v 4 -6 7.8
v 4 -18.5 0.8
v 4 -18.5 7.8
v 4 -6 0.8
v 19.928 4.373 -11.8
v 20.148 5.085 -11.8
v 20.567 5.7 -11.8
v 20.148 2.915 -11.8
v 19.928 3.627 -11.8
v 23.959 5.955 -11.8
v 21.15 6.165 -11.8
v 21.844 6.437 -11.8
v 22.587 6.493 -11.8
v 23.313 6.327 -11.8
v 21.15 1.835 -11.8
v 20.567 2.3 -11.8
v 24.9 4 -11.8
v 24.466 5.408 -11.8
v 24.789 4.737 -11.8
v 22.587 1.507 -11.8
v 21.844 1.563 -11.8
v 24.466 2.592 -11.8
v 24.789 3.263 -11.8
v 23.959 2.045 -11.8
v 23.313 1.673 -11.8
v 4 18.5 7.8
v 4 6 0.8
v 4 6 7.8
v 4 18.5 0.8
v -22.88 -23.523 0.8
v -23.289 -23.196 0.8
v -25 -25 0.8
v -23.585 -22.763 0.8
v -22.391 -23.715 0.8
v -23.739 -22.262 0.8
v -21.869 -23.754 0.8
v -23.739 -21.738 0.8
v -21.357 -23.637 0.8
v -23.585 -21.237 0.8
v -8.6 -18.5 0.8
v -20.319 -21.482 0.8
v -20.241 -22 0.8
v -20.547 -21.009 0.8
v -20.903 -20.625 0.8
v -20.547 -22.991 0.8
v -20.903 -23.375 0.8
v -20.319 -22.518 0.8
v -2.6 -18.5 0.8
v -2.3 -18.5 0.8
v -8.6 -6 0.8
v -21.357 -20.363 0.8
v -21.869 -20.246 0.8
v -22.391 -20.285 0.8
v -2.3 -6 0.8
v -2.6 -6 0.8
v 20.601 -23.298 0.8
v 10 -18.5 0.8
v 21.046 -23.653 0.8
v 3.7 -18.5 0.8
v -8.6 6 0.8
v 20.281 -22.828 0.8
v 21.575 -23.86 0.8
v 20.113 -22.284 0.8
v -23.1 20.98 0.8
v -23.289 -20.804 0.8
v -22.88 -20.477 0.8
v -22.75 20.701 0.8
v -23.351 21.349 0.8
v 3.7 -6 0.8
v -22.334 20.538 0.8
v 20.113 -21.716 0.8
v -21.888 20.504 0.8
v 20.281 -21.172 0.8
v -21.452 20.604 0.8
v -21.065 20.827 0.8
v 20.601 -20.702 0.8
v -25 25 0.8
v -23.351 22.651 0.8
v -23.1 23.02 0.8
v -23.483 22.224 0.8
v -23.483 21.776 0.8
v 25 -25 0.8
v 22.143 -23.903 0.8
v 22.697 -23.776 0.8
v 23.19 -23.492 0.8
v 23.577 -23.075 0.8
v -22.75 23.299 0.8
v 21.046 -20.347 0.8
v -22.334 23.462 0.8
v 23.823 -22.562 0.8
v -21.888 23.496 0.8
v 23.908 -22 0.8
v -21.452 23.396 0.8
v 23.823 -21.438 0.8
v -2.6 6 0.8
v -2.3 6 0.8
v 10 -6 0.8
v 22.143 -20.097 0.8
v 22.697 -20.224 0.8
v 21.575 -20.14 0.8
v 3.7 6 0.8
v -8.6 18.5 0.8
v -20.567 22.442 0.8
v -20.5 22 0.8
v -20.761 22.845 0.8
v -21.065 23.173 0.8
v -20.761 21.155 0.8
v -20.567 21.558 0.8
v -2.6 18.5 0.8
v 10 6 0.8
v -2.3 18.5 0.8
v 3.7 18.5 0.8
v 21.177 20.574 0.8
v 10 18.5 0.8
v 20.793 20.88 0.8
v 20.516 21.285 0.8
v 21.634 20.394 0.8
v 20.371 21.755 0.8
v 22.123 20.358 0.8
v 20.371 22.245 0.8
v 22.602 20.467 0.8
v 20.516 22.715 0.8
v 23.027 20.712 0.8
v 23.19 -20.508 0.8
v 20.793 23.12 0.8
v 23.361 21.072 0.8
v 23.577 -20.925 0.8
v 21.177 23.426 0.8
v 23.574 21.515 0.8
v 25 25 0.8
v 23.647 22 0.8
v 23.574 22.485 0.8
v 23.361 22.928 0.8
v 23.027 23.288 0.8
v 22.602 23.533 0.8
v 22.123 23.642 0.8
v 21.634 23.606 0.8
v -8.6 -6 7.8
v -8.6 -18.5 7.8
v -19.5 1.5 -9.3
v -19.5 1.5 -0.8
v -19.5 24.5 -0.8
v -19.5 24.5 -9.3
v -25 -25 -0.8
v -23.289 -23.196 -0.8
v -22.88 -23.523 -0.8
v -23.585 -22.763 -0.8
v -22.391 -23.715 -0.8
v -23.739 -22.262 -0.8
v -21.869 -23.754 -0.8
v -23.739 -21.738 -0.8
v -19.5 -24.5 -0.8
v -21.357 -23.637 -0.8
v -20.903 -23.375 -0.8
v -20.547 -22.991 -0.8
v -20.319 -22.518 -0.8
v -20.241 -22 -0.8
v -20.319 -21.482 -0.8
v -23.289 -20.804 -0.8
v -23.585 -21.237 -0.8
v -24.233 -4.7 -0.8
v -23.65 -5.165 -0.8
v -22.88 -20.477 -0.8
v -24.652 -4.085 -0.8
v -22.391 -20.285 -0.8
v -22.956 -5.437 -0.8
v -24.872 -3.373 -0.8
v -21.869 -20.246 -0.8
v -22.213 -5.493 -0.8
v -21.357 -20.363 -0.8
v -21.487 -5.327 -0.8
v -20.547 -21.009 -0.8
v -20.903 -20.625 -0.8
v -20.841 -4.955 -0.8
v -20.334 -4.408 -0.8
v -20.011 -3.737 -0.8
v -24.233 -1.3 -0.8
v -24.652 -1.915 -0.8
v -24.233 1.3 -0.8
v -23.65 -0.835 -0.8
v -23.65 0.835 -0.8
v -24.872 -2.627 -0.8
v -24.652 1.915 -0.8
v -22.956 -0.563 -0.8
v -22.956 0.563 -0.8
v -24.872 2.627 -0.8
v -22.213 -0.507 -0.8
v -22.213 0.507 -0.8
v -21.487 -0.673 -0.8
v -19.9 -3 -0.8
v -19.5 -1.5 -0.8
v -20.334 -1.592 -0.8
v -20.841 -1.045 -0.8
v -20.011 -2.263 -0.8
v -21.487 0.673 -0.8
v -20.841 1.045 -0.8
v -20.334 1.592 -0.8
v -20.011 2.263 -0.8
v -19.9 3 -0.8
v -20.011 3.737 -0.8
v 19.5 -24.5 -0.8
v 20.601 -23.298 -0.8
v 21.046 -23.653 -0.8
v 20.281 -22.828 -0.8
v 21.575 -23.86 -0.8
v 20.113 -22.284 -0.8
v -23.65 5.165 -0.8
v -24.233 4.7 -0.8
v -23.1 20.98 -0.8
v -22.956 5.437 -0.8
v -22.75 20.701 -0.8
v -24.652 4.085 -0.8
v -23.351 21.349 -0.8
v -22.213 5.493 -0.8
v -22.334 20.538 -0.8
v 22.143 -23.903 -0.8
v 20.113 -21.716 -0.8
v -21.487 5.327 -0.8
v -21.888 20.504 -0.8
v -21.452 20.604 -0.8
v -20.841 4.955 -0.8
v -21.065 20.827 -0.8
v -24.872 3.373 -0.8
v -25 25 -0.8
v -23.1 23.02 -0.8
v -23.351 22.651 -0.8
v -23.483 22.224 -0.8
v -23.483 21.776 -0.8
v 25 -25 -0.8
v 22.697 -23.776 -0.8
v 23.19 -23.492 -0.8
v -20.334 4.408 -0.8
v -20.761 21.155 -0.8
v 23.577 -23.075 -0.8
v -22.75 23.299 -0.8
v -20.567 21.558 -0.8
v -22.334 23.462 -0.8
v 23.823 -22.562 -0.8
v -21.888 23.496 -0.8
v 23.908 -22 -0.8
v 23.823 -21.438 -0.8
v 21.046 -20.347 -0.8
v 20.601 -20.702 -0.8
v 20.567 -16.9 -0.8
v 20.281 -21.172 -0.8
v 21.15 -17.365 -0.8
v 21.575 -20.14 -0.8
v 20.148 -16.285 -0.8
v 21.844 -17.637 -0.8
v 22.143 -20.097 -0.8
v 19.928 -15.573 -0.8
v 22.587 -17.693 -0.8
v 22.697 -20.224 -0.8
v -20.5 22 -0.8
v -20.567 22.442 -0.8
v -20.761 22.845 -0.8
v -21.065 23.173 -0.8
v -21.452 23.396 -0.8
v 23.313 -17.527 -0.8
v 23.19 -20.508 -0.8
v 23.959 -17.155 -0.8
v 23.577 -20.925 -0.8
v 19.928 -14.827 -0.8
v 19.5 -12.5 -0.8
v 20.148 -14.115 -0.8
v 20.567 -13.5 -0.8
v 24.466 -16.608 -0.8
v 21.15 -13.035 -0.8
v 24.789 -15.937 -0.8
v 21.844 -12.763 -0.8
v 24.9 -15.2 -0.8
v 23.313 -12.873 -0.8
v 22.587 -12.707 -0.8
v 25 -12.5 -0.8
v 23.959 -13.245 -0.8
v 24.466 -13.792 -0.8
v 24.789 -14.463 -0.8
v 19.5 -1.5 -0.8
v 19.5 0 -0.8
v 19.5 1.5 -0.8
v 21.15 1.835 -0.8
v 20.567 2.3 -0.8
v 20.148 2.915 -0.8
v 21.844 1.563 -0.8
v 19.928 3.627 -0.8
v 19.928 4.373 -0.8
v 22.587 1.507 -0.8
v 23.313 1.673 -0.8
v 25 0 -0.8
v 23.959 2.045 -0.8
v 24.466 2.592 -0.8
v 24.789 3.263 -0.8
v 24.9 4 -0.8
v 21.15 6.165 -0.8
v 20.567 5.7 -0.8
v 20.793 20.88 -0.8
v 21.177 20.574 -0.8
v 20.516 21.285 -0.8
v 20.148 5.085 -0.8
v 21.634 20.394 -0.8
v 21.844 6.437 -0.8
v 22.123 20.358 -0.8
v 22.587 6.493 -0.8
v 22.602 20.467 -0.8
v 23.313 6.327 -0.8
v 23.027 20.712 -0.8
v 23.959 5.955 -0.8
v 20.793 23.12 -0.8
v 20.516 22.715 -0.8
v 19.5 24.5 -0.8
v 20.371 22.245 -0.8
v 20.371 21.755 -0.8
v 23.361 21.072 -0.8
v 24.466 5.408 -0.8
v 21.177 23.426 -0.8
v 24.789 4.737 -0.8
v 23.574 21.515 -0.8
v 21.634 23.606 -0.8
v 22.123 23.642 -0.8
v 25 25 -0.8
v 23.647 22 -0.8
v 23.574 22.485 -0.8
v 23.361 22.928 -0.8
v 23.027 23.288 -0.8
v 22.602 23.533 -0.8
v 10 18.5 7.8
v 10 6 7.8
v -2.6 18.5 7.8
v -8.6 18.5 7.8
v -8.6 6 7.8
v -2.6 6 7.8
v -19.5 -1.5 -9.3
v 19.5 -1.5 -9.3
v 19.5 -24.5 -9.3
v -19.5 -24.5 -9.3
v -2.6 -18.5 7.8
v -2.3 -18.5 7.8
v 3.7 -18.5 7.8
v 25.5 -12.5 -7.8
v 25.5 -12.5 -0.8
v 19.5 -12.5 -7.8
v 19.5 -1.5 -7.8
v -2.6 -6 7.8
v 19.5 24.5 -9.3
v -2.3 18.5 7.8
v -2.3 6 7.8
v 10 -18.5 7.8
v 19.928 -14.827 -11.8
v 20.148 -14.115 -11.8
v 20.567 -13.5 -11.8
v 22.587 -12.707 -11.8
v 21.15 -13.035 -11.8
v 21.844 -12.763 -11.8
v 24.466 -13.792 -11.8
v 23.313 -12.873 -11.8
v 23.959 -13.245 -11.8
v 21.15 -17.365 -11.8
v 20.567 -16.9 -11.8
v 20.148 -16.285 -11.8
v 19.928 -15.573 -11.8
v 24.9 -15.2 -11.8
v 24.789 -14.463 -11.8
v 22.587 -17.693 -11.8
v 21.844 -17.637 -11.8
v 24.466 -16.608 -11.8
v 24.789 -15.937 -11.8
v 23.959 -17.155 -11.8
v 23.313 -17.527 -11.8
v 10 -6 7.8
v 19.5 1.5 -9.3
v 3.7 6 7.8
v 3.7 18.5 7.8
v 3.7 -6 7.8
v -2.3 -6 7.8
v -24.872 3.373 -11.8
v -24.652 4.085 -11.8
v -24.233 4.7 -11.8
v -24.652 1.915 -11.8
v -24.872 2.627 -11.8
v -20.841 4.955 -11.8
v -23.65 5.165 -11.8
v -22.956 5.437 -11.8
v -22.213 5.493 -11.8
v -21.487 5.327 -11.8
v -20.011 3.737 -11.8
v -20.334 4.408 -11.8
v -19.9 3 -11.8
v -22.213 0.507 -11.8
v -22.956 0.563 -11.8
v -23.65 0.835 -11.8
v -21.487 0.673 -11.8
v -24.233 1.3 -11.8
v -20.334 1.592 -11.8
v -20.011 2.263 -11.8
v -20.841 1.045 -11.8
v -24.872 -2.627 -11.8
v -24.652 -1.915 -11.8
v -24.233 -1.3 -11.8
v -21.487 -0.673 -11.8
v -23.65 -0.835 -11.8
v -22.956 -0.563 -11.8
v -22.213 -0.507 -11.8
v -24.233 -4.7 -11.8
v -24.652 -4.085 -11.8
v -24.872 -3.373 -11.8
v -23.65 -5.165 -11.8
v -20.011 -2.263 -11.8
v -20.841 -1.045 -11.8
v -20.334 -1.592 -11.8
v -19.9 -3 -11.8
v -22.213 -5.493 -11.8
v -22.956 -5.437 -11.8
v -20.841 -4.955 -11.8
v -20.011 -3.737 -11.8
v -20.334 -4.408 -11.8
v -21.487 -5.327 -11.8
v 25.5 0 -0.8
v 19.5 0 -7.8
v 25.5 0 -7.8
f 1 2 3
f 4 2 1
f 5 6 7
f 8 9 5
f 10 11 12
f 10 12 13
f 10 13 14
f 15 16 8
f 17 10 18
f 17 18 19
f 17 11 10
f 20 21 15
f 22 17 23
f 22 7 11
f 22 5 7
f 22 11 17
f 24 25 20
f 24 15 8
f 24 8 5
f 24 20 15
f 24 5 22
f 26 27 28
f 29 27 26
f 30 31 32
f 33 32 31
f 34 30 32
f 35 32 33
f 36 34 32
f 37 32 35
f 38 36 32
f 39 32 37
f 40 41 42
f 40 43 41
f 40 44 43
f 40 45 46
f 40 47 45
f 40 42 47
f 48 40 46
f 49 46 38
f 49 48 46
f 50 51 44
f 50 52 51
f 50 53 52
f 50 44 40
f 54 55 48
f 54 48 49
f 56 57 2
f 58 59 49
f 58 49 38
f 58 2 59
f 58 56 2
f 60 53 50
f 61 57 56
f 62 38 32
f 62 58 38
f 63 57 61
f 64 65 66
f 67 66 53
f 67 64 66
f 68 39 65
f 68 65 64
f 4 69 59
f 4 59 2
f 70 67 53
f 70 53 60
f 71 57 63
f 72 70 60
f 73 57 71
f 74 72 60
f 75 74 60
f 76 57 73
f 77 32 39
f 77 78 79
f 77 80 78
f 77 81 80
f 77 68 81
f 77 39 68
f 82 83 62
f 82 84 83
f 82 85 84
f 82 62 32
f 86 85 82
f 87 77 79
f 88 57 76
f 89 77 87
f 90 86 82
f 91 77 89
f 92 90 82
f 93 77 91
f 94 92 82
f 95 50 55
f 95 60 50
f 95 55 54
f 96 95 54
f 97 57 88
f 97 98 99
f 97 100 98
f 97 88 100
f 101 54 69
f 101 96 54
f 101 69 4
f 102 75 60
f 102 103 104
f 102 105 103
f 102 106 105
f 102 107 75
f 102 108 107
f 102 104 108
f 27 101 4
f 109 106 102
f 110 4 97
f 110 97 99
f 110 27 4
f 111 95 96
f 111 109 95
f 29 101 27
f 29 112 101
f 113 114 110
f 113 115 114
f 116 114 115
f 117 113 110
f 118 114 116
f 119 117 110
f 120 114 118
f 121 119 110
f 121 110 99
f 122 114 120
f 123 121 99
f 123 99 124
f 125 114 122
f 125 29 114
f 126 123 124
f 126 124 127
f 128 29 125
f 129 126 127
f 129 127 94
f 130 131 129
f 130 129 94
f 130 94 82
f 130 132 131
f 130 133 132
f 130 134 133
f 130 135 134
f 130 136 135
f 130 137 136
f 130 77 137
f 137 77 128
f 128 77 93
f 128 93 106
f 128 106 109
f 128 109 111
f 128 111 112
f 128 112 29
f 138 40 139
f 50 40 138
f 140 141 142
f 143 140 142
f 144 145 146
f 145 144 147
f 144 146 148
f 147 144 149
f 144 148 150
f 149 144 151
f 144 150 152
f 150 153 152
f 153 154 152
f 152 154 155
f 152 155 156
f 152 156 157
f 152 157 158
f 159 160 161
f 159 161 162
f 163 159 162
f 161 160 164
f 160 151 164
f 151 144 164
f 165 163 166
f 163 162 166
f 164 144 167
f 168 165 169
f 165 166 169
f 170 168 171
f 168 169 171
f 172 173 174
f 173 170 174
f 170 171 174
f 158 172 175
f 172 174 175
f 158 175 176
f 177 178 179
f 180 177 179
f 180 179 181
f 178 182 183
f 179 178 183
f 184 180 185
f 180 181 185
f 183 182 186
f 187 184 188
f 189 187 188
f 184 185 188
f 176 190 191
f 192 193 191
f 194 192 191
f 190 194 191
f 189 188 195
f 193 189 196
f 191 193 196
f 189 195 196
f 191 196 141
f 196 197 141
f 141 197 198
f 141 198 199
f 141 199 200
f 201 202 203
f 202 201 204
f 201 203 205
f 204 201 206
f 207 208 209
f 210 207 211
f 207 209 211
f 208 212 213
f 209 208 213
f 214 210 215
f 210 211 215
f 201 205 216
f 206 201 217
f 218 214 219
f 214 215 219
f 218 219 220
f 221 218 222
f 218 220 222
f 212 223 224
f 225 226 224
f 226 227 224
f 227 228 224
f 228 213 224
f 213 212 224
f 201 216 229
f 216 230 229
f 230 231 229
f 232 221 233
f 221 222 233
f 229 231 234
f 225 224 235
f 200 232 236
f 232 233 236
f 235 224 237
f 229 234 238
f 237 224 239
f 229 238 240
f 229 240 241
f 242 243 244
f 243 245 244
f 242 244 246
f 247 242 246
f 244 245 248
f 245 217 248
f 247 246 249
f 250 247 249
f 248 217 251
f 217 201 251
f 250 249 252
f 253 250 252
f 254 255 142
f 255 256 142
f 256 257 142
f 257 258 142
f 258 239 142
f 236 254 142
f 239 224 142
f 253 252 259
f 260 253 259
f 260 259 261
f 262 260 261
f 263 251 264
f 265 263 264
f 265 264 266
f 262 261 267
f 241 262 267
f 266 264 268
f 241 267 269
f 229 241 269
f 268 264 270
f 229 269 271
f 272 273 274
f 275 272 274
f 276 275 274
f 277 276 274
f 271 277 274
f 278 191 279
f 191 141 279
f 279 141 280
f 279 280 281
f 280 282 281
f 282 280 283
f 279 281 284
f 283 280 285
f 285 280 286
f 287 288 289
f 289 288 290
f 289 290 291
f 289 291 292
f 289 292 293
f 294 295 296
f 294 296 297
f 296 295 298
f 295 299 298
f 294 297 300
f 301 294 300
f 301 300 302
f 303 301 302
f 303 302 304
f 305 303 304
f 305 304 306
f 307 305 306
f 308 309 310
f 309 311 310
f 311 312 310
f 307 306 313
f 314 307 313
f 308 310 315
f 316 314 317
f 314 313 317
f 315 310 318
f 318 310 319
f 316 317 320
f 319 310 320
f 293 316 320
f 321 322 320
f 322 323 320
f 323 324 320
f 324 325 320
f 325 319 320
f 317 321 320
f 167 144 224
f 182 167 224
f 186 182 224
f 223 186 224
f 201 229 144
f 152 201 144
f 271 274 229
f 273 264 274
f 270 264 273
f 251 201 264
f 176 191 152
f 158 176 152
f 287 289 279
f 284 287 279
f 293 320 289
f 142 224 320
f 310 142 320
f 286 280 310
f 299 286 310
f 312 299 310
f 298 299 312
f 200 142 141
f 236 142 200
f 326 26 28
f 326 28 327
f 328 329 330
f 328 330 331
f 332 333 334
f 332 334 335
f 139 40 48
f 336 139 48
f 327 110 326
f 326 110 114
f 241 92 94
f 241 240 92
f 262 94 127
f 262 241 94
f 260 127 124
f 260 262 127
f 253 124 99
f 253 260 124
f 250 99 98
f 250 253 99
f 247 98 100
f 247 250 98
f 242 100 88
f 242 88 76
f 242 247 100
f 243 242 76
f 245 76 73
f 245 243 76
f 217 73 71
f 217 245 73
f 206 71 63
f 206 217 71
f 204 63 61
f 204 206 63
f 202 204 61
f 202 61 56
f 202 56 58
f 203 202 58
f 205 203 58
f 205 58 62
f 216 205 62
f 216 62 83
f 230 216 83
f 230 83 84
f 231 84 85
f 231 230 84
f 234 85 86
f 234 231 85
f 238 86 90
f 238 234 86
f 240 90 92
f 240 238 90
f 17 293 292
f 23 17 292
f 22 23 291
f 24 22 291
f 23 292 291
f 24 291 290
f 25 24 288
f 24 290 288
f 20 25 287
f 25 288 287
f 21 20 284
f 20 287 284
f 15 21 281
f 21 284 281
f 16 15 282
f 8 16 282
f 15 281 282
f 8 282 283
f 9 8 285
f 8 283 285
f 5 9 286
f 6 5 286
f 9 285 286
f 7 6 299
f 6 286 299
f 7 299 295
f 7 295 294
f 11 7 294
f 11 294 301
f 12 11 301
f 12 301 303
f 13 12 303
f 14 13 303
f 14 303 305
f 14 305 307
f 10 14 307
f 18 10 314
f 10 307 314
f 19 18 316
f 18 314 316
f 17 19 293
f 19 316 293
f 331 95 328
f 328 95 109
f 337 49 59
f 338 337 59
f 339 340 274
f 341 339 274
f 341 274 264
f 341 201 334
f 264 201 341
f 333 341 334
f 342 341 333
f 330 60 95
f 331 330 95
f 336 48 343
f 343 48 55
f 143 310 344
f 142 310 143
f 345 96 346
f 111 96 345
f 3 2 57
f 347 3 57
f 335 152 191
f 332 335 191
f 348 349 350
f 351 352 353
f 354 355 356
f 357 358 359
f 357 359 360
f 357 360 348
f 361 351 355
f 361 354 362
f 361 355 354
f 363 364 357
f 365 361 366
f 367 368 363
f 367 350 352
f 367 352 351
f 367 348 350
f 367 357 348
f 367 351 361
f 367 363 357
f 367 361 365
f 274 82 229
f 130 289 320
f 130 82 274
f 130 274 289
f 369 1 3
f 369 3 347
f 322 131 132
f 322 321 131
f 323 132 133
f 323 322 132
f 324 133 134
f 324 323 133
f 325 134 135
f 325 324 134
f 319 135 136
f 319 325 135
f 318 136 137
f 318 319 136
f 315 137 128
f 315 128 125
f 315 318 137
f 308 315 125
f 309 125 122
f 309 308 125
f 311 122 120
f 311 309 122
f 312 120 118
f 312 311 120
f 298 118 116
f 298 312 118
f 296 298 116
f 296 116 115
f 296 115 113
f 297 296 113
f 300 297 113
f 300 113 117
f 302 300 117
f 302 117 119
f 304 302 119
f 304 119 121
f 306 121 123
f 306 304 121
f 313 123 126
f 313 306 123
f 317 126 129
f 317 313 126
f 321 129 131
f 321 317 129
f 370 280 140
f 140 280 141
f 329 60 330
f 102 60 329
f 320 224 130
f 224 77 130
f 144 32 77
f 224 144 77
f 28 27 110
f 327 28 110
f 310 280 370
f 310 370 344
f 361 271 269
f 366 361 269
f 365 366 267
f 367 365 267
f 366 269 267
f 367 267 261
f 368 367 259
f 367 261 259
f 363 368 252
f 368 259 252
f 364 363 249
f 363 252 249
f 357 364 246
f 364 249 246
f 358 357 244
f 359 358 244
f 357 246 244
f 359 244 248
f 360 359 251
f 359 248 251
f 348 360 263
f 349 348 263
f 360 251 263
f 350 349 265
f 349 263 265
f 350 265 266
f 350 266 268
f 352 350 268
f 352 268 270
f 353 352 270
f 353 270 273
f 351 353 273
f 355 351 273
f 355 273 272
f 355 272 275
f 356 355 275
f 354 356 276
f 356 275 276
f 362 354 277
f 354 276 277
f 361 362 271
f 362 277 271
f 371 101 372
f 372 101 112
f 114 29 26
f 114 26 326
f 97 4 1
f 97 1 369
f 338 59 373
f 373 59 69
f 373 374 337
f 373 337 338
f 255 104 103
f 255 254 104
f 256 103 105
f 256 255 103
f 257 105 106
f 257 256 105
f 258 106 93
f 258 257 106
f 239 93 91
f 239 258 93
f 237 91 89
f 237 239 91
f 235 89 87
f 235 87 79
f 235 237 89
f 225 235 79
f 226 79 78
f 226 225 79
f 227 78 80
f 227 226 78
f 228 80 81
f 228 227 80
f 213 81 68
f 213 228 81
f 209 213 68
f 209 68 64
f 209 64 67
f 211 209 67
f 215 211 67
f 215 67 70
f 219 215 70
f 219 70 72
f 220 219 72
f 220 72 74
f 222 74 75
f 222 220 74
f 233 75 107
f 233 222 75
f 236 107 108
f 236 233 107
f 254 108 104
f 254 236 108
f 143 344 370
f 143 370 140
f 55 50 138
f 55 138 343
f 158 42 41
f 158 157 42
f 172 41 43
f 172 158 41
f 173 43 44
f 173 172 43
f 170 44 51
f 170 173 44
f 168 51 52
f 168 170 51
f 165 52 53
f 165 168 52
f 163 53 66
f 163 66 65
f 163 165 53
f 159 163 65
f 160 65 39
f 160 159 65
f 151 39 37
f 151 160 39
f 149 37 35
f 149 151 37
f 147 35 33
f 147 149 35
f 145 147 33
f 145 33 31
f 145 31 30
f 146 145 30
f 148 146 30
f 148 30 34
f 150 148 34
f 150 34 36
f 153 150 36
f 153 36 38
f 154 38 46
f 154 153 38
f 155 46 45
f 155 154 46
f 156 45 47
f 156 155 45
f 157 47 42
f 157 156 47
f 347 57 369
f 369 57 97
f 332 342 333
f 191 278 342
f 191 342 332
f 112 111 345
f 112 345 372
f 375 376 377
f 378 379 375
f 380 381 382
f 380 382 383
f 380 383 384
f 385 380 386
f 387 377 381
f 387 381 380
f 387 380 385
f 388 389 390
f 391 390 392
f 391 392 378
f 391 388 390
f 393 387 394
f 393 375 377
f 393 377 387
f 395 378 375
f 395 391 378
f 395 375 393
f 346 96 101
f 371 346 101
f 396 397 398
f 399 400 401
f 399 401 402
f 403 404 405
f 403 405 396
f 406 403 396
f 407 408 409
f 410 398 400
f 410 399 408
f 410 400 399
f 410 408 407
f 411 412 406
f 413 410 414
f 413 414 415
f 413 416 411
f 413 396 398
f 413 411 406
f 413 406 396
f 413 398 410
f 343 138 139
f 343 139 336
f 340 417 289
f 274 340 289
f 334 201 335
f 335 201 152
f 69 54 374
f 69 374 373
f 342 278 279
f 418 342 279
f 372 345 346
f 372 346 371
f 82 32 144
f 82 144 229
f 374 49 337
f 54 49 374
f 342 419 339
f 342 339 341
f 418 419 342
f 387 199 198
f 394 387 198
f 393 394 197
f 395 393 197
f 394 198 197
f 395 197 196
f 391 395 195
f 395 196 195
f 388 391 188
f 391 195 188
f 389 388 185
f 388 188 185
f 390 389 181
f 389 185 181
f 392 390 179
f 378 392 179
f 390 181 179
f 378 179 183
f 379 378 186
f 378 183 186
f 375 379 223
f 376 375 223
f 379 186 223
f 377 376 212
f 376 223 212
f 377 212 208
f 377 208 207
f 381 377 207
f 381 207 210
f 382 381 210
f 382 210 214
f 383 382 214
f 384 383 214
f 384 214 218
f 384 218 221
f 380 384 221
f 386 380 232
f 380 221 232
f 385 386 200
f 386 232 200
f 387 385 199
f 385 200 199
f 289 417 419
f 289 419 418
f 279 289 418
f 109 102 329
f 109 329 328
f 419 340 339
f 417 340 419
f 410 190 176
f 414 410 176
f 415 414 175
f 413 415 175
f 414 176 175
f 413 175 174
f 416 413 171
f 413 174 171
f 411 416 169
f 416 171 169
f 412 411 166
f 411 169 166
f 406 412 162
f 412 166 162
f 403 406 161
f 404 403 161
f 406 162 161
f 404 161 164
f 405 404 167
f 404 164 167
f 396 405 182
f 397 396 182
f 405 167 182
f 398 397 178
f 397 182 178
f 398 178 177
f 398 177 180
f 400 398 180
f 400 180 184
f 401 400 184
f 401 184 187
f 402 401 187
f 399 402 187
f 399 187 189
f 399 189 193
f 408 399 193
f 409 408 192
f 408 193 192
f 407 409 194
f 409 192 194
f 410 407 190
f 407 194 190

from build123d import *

# Parameters (mm, degrees)
SKETCH1_W      = 50
SKETCH1_H      = 50
SKETCH1_R      = 1.5
SKETCH1_R_2    = 1.646935024
SKETCH1_R_3    = 1.908192471
SKETCH1_R_4    = 1.759080553
EXTRUDE2_DEPTH = 0.8
SKETCH2_W      = 6
SKETCH2_H      = 12.5
EXTRUDE3_DEPTH = 7
SKETCH3_W      = 6
SKETCH3_H      = 12.5
EXTRUDE4_DEPTH = 7
SKETCH4_W      = 39
SKETCH4_H      = 23
EXTRUDE5_DEPTH = 8.5
SKETCH5_R      = 2.5
EXTRUDE8_DEPTH = 11


with BuildPart() as part:
    # Sketch1 → Extrude2 (new, symmetric)
    with BuildSketch(Plane.XY):
        Rectangle(SKETCH1_W, SKETCH1_H)
        with Locations((-22, 22)):
            Circle(SKETCH1_R, mode=Mode.SUBTRACT)
        with Locations((22, 22)):
            Circle(SKETCH1_R_2, mode=Mode.SUBTRACT)
        with Locations((22, -22)):
            Circle(SKETCH1_R_3, mode=Mode.SUBTRACT)
        with Locations((-22, -22)):
            Circle(SKETCH1_R_4, mode=Mode.SUBTRACT)
    extrude(amount=EXTRUDE2_DEPTH, both=True)

    # Sketch2 → Extrude3 (add)
    with BuildSketch(Plane.XY.offset(0.8)):
        with Locations((7, 12.25)):
            Rectangle(SKETCH2_W, SKETCH2_H)
        with Locations((7, -12.25)):
            Rectangle(SKETCH2_W, SKETCH2_H)
        with Locations((0.7, 12.25)):
            Rectangle(SKETCH2_W, SKETCH2_H)
        with Locations((0.7, -12.25)):
            Rectangle(SKETCH2_W, SKETCH2_H)
        with Locations((-5.6, 12.25)):
            Rectangle(SKETCH2_W, SKETCH2_H)
        with Locations((-5.6, -12.25)):
            Rectangle(SKETCH2_W, SKETCH2_H)
    extrude(amount=EXTRUDE3_DEPTH)

    # Sketch3 → Extrude4 (add)
    with BuildSketch(Plane(origin=(0, 0, -0.8), x_dir=(-1, 0, 0), z_dir=(0, 0, -1))):
        with Locations((-22.5, -6.25)):
            Rectangle(SKETCH3_W, SKETCH3_H)
    extrude(amount=EXTRUDE4_DEPTH)

    # Sketch4 → Extrude5 (add)
    with BuildSketch(Plane(origin=(0, 0, -0.8), x_dir=(-1, 0, 0), z_dir=(0, 0, -1))):
        with Locations((0, -13)):
            Rectangle(SKETCH4_W, SKETCH4_H)
        with Locations((0, 13)):
            Rectangle(SKETCH4_W, SKETCH4_H)
    extrude(amount=EXTRUDE5_DEPTH)

    # Sketch5 → Extrude8 (add)
    with BuildSketch(Plane(origin=(0, 0, -0.8), x_dir=(-1, 0, 0), z_dir=(0, 0, -1))):
        with Locations(Location((22.4, -3, 0), (0, 0, 180))):
            Circle(SKETCH5_R)
        with Locations(Location((22.4, 3, 0), (0, 0, 180))):
            Circle(SKETCH5_R)
        with Locations(Location((-22.4, -15.2, 0), (0, 0, 180))):
            Circle(SKETCH5_R)
        with Locations(Location((-22.4, 4, 0), (0, 0, 180))):
            Circle(SKETCH5_R)
    extrude(amount=EXTRUDE8_DEPTH)


solid = part.part
